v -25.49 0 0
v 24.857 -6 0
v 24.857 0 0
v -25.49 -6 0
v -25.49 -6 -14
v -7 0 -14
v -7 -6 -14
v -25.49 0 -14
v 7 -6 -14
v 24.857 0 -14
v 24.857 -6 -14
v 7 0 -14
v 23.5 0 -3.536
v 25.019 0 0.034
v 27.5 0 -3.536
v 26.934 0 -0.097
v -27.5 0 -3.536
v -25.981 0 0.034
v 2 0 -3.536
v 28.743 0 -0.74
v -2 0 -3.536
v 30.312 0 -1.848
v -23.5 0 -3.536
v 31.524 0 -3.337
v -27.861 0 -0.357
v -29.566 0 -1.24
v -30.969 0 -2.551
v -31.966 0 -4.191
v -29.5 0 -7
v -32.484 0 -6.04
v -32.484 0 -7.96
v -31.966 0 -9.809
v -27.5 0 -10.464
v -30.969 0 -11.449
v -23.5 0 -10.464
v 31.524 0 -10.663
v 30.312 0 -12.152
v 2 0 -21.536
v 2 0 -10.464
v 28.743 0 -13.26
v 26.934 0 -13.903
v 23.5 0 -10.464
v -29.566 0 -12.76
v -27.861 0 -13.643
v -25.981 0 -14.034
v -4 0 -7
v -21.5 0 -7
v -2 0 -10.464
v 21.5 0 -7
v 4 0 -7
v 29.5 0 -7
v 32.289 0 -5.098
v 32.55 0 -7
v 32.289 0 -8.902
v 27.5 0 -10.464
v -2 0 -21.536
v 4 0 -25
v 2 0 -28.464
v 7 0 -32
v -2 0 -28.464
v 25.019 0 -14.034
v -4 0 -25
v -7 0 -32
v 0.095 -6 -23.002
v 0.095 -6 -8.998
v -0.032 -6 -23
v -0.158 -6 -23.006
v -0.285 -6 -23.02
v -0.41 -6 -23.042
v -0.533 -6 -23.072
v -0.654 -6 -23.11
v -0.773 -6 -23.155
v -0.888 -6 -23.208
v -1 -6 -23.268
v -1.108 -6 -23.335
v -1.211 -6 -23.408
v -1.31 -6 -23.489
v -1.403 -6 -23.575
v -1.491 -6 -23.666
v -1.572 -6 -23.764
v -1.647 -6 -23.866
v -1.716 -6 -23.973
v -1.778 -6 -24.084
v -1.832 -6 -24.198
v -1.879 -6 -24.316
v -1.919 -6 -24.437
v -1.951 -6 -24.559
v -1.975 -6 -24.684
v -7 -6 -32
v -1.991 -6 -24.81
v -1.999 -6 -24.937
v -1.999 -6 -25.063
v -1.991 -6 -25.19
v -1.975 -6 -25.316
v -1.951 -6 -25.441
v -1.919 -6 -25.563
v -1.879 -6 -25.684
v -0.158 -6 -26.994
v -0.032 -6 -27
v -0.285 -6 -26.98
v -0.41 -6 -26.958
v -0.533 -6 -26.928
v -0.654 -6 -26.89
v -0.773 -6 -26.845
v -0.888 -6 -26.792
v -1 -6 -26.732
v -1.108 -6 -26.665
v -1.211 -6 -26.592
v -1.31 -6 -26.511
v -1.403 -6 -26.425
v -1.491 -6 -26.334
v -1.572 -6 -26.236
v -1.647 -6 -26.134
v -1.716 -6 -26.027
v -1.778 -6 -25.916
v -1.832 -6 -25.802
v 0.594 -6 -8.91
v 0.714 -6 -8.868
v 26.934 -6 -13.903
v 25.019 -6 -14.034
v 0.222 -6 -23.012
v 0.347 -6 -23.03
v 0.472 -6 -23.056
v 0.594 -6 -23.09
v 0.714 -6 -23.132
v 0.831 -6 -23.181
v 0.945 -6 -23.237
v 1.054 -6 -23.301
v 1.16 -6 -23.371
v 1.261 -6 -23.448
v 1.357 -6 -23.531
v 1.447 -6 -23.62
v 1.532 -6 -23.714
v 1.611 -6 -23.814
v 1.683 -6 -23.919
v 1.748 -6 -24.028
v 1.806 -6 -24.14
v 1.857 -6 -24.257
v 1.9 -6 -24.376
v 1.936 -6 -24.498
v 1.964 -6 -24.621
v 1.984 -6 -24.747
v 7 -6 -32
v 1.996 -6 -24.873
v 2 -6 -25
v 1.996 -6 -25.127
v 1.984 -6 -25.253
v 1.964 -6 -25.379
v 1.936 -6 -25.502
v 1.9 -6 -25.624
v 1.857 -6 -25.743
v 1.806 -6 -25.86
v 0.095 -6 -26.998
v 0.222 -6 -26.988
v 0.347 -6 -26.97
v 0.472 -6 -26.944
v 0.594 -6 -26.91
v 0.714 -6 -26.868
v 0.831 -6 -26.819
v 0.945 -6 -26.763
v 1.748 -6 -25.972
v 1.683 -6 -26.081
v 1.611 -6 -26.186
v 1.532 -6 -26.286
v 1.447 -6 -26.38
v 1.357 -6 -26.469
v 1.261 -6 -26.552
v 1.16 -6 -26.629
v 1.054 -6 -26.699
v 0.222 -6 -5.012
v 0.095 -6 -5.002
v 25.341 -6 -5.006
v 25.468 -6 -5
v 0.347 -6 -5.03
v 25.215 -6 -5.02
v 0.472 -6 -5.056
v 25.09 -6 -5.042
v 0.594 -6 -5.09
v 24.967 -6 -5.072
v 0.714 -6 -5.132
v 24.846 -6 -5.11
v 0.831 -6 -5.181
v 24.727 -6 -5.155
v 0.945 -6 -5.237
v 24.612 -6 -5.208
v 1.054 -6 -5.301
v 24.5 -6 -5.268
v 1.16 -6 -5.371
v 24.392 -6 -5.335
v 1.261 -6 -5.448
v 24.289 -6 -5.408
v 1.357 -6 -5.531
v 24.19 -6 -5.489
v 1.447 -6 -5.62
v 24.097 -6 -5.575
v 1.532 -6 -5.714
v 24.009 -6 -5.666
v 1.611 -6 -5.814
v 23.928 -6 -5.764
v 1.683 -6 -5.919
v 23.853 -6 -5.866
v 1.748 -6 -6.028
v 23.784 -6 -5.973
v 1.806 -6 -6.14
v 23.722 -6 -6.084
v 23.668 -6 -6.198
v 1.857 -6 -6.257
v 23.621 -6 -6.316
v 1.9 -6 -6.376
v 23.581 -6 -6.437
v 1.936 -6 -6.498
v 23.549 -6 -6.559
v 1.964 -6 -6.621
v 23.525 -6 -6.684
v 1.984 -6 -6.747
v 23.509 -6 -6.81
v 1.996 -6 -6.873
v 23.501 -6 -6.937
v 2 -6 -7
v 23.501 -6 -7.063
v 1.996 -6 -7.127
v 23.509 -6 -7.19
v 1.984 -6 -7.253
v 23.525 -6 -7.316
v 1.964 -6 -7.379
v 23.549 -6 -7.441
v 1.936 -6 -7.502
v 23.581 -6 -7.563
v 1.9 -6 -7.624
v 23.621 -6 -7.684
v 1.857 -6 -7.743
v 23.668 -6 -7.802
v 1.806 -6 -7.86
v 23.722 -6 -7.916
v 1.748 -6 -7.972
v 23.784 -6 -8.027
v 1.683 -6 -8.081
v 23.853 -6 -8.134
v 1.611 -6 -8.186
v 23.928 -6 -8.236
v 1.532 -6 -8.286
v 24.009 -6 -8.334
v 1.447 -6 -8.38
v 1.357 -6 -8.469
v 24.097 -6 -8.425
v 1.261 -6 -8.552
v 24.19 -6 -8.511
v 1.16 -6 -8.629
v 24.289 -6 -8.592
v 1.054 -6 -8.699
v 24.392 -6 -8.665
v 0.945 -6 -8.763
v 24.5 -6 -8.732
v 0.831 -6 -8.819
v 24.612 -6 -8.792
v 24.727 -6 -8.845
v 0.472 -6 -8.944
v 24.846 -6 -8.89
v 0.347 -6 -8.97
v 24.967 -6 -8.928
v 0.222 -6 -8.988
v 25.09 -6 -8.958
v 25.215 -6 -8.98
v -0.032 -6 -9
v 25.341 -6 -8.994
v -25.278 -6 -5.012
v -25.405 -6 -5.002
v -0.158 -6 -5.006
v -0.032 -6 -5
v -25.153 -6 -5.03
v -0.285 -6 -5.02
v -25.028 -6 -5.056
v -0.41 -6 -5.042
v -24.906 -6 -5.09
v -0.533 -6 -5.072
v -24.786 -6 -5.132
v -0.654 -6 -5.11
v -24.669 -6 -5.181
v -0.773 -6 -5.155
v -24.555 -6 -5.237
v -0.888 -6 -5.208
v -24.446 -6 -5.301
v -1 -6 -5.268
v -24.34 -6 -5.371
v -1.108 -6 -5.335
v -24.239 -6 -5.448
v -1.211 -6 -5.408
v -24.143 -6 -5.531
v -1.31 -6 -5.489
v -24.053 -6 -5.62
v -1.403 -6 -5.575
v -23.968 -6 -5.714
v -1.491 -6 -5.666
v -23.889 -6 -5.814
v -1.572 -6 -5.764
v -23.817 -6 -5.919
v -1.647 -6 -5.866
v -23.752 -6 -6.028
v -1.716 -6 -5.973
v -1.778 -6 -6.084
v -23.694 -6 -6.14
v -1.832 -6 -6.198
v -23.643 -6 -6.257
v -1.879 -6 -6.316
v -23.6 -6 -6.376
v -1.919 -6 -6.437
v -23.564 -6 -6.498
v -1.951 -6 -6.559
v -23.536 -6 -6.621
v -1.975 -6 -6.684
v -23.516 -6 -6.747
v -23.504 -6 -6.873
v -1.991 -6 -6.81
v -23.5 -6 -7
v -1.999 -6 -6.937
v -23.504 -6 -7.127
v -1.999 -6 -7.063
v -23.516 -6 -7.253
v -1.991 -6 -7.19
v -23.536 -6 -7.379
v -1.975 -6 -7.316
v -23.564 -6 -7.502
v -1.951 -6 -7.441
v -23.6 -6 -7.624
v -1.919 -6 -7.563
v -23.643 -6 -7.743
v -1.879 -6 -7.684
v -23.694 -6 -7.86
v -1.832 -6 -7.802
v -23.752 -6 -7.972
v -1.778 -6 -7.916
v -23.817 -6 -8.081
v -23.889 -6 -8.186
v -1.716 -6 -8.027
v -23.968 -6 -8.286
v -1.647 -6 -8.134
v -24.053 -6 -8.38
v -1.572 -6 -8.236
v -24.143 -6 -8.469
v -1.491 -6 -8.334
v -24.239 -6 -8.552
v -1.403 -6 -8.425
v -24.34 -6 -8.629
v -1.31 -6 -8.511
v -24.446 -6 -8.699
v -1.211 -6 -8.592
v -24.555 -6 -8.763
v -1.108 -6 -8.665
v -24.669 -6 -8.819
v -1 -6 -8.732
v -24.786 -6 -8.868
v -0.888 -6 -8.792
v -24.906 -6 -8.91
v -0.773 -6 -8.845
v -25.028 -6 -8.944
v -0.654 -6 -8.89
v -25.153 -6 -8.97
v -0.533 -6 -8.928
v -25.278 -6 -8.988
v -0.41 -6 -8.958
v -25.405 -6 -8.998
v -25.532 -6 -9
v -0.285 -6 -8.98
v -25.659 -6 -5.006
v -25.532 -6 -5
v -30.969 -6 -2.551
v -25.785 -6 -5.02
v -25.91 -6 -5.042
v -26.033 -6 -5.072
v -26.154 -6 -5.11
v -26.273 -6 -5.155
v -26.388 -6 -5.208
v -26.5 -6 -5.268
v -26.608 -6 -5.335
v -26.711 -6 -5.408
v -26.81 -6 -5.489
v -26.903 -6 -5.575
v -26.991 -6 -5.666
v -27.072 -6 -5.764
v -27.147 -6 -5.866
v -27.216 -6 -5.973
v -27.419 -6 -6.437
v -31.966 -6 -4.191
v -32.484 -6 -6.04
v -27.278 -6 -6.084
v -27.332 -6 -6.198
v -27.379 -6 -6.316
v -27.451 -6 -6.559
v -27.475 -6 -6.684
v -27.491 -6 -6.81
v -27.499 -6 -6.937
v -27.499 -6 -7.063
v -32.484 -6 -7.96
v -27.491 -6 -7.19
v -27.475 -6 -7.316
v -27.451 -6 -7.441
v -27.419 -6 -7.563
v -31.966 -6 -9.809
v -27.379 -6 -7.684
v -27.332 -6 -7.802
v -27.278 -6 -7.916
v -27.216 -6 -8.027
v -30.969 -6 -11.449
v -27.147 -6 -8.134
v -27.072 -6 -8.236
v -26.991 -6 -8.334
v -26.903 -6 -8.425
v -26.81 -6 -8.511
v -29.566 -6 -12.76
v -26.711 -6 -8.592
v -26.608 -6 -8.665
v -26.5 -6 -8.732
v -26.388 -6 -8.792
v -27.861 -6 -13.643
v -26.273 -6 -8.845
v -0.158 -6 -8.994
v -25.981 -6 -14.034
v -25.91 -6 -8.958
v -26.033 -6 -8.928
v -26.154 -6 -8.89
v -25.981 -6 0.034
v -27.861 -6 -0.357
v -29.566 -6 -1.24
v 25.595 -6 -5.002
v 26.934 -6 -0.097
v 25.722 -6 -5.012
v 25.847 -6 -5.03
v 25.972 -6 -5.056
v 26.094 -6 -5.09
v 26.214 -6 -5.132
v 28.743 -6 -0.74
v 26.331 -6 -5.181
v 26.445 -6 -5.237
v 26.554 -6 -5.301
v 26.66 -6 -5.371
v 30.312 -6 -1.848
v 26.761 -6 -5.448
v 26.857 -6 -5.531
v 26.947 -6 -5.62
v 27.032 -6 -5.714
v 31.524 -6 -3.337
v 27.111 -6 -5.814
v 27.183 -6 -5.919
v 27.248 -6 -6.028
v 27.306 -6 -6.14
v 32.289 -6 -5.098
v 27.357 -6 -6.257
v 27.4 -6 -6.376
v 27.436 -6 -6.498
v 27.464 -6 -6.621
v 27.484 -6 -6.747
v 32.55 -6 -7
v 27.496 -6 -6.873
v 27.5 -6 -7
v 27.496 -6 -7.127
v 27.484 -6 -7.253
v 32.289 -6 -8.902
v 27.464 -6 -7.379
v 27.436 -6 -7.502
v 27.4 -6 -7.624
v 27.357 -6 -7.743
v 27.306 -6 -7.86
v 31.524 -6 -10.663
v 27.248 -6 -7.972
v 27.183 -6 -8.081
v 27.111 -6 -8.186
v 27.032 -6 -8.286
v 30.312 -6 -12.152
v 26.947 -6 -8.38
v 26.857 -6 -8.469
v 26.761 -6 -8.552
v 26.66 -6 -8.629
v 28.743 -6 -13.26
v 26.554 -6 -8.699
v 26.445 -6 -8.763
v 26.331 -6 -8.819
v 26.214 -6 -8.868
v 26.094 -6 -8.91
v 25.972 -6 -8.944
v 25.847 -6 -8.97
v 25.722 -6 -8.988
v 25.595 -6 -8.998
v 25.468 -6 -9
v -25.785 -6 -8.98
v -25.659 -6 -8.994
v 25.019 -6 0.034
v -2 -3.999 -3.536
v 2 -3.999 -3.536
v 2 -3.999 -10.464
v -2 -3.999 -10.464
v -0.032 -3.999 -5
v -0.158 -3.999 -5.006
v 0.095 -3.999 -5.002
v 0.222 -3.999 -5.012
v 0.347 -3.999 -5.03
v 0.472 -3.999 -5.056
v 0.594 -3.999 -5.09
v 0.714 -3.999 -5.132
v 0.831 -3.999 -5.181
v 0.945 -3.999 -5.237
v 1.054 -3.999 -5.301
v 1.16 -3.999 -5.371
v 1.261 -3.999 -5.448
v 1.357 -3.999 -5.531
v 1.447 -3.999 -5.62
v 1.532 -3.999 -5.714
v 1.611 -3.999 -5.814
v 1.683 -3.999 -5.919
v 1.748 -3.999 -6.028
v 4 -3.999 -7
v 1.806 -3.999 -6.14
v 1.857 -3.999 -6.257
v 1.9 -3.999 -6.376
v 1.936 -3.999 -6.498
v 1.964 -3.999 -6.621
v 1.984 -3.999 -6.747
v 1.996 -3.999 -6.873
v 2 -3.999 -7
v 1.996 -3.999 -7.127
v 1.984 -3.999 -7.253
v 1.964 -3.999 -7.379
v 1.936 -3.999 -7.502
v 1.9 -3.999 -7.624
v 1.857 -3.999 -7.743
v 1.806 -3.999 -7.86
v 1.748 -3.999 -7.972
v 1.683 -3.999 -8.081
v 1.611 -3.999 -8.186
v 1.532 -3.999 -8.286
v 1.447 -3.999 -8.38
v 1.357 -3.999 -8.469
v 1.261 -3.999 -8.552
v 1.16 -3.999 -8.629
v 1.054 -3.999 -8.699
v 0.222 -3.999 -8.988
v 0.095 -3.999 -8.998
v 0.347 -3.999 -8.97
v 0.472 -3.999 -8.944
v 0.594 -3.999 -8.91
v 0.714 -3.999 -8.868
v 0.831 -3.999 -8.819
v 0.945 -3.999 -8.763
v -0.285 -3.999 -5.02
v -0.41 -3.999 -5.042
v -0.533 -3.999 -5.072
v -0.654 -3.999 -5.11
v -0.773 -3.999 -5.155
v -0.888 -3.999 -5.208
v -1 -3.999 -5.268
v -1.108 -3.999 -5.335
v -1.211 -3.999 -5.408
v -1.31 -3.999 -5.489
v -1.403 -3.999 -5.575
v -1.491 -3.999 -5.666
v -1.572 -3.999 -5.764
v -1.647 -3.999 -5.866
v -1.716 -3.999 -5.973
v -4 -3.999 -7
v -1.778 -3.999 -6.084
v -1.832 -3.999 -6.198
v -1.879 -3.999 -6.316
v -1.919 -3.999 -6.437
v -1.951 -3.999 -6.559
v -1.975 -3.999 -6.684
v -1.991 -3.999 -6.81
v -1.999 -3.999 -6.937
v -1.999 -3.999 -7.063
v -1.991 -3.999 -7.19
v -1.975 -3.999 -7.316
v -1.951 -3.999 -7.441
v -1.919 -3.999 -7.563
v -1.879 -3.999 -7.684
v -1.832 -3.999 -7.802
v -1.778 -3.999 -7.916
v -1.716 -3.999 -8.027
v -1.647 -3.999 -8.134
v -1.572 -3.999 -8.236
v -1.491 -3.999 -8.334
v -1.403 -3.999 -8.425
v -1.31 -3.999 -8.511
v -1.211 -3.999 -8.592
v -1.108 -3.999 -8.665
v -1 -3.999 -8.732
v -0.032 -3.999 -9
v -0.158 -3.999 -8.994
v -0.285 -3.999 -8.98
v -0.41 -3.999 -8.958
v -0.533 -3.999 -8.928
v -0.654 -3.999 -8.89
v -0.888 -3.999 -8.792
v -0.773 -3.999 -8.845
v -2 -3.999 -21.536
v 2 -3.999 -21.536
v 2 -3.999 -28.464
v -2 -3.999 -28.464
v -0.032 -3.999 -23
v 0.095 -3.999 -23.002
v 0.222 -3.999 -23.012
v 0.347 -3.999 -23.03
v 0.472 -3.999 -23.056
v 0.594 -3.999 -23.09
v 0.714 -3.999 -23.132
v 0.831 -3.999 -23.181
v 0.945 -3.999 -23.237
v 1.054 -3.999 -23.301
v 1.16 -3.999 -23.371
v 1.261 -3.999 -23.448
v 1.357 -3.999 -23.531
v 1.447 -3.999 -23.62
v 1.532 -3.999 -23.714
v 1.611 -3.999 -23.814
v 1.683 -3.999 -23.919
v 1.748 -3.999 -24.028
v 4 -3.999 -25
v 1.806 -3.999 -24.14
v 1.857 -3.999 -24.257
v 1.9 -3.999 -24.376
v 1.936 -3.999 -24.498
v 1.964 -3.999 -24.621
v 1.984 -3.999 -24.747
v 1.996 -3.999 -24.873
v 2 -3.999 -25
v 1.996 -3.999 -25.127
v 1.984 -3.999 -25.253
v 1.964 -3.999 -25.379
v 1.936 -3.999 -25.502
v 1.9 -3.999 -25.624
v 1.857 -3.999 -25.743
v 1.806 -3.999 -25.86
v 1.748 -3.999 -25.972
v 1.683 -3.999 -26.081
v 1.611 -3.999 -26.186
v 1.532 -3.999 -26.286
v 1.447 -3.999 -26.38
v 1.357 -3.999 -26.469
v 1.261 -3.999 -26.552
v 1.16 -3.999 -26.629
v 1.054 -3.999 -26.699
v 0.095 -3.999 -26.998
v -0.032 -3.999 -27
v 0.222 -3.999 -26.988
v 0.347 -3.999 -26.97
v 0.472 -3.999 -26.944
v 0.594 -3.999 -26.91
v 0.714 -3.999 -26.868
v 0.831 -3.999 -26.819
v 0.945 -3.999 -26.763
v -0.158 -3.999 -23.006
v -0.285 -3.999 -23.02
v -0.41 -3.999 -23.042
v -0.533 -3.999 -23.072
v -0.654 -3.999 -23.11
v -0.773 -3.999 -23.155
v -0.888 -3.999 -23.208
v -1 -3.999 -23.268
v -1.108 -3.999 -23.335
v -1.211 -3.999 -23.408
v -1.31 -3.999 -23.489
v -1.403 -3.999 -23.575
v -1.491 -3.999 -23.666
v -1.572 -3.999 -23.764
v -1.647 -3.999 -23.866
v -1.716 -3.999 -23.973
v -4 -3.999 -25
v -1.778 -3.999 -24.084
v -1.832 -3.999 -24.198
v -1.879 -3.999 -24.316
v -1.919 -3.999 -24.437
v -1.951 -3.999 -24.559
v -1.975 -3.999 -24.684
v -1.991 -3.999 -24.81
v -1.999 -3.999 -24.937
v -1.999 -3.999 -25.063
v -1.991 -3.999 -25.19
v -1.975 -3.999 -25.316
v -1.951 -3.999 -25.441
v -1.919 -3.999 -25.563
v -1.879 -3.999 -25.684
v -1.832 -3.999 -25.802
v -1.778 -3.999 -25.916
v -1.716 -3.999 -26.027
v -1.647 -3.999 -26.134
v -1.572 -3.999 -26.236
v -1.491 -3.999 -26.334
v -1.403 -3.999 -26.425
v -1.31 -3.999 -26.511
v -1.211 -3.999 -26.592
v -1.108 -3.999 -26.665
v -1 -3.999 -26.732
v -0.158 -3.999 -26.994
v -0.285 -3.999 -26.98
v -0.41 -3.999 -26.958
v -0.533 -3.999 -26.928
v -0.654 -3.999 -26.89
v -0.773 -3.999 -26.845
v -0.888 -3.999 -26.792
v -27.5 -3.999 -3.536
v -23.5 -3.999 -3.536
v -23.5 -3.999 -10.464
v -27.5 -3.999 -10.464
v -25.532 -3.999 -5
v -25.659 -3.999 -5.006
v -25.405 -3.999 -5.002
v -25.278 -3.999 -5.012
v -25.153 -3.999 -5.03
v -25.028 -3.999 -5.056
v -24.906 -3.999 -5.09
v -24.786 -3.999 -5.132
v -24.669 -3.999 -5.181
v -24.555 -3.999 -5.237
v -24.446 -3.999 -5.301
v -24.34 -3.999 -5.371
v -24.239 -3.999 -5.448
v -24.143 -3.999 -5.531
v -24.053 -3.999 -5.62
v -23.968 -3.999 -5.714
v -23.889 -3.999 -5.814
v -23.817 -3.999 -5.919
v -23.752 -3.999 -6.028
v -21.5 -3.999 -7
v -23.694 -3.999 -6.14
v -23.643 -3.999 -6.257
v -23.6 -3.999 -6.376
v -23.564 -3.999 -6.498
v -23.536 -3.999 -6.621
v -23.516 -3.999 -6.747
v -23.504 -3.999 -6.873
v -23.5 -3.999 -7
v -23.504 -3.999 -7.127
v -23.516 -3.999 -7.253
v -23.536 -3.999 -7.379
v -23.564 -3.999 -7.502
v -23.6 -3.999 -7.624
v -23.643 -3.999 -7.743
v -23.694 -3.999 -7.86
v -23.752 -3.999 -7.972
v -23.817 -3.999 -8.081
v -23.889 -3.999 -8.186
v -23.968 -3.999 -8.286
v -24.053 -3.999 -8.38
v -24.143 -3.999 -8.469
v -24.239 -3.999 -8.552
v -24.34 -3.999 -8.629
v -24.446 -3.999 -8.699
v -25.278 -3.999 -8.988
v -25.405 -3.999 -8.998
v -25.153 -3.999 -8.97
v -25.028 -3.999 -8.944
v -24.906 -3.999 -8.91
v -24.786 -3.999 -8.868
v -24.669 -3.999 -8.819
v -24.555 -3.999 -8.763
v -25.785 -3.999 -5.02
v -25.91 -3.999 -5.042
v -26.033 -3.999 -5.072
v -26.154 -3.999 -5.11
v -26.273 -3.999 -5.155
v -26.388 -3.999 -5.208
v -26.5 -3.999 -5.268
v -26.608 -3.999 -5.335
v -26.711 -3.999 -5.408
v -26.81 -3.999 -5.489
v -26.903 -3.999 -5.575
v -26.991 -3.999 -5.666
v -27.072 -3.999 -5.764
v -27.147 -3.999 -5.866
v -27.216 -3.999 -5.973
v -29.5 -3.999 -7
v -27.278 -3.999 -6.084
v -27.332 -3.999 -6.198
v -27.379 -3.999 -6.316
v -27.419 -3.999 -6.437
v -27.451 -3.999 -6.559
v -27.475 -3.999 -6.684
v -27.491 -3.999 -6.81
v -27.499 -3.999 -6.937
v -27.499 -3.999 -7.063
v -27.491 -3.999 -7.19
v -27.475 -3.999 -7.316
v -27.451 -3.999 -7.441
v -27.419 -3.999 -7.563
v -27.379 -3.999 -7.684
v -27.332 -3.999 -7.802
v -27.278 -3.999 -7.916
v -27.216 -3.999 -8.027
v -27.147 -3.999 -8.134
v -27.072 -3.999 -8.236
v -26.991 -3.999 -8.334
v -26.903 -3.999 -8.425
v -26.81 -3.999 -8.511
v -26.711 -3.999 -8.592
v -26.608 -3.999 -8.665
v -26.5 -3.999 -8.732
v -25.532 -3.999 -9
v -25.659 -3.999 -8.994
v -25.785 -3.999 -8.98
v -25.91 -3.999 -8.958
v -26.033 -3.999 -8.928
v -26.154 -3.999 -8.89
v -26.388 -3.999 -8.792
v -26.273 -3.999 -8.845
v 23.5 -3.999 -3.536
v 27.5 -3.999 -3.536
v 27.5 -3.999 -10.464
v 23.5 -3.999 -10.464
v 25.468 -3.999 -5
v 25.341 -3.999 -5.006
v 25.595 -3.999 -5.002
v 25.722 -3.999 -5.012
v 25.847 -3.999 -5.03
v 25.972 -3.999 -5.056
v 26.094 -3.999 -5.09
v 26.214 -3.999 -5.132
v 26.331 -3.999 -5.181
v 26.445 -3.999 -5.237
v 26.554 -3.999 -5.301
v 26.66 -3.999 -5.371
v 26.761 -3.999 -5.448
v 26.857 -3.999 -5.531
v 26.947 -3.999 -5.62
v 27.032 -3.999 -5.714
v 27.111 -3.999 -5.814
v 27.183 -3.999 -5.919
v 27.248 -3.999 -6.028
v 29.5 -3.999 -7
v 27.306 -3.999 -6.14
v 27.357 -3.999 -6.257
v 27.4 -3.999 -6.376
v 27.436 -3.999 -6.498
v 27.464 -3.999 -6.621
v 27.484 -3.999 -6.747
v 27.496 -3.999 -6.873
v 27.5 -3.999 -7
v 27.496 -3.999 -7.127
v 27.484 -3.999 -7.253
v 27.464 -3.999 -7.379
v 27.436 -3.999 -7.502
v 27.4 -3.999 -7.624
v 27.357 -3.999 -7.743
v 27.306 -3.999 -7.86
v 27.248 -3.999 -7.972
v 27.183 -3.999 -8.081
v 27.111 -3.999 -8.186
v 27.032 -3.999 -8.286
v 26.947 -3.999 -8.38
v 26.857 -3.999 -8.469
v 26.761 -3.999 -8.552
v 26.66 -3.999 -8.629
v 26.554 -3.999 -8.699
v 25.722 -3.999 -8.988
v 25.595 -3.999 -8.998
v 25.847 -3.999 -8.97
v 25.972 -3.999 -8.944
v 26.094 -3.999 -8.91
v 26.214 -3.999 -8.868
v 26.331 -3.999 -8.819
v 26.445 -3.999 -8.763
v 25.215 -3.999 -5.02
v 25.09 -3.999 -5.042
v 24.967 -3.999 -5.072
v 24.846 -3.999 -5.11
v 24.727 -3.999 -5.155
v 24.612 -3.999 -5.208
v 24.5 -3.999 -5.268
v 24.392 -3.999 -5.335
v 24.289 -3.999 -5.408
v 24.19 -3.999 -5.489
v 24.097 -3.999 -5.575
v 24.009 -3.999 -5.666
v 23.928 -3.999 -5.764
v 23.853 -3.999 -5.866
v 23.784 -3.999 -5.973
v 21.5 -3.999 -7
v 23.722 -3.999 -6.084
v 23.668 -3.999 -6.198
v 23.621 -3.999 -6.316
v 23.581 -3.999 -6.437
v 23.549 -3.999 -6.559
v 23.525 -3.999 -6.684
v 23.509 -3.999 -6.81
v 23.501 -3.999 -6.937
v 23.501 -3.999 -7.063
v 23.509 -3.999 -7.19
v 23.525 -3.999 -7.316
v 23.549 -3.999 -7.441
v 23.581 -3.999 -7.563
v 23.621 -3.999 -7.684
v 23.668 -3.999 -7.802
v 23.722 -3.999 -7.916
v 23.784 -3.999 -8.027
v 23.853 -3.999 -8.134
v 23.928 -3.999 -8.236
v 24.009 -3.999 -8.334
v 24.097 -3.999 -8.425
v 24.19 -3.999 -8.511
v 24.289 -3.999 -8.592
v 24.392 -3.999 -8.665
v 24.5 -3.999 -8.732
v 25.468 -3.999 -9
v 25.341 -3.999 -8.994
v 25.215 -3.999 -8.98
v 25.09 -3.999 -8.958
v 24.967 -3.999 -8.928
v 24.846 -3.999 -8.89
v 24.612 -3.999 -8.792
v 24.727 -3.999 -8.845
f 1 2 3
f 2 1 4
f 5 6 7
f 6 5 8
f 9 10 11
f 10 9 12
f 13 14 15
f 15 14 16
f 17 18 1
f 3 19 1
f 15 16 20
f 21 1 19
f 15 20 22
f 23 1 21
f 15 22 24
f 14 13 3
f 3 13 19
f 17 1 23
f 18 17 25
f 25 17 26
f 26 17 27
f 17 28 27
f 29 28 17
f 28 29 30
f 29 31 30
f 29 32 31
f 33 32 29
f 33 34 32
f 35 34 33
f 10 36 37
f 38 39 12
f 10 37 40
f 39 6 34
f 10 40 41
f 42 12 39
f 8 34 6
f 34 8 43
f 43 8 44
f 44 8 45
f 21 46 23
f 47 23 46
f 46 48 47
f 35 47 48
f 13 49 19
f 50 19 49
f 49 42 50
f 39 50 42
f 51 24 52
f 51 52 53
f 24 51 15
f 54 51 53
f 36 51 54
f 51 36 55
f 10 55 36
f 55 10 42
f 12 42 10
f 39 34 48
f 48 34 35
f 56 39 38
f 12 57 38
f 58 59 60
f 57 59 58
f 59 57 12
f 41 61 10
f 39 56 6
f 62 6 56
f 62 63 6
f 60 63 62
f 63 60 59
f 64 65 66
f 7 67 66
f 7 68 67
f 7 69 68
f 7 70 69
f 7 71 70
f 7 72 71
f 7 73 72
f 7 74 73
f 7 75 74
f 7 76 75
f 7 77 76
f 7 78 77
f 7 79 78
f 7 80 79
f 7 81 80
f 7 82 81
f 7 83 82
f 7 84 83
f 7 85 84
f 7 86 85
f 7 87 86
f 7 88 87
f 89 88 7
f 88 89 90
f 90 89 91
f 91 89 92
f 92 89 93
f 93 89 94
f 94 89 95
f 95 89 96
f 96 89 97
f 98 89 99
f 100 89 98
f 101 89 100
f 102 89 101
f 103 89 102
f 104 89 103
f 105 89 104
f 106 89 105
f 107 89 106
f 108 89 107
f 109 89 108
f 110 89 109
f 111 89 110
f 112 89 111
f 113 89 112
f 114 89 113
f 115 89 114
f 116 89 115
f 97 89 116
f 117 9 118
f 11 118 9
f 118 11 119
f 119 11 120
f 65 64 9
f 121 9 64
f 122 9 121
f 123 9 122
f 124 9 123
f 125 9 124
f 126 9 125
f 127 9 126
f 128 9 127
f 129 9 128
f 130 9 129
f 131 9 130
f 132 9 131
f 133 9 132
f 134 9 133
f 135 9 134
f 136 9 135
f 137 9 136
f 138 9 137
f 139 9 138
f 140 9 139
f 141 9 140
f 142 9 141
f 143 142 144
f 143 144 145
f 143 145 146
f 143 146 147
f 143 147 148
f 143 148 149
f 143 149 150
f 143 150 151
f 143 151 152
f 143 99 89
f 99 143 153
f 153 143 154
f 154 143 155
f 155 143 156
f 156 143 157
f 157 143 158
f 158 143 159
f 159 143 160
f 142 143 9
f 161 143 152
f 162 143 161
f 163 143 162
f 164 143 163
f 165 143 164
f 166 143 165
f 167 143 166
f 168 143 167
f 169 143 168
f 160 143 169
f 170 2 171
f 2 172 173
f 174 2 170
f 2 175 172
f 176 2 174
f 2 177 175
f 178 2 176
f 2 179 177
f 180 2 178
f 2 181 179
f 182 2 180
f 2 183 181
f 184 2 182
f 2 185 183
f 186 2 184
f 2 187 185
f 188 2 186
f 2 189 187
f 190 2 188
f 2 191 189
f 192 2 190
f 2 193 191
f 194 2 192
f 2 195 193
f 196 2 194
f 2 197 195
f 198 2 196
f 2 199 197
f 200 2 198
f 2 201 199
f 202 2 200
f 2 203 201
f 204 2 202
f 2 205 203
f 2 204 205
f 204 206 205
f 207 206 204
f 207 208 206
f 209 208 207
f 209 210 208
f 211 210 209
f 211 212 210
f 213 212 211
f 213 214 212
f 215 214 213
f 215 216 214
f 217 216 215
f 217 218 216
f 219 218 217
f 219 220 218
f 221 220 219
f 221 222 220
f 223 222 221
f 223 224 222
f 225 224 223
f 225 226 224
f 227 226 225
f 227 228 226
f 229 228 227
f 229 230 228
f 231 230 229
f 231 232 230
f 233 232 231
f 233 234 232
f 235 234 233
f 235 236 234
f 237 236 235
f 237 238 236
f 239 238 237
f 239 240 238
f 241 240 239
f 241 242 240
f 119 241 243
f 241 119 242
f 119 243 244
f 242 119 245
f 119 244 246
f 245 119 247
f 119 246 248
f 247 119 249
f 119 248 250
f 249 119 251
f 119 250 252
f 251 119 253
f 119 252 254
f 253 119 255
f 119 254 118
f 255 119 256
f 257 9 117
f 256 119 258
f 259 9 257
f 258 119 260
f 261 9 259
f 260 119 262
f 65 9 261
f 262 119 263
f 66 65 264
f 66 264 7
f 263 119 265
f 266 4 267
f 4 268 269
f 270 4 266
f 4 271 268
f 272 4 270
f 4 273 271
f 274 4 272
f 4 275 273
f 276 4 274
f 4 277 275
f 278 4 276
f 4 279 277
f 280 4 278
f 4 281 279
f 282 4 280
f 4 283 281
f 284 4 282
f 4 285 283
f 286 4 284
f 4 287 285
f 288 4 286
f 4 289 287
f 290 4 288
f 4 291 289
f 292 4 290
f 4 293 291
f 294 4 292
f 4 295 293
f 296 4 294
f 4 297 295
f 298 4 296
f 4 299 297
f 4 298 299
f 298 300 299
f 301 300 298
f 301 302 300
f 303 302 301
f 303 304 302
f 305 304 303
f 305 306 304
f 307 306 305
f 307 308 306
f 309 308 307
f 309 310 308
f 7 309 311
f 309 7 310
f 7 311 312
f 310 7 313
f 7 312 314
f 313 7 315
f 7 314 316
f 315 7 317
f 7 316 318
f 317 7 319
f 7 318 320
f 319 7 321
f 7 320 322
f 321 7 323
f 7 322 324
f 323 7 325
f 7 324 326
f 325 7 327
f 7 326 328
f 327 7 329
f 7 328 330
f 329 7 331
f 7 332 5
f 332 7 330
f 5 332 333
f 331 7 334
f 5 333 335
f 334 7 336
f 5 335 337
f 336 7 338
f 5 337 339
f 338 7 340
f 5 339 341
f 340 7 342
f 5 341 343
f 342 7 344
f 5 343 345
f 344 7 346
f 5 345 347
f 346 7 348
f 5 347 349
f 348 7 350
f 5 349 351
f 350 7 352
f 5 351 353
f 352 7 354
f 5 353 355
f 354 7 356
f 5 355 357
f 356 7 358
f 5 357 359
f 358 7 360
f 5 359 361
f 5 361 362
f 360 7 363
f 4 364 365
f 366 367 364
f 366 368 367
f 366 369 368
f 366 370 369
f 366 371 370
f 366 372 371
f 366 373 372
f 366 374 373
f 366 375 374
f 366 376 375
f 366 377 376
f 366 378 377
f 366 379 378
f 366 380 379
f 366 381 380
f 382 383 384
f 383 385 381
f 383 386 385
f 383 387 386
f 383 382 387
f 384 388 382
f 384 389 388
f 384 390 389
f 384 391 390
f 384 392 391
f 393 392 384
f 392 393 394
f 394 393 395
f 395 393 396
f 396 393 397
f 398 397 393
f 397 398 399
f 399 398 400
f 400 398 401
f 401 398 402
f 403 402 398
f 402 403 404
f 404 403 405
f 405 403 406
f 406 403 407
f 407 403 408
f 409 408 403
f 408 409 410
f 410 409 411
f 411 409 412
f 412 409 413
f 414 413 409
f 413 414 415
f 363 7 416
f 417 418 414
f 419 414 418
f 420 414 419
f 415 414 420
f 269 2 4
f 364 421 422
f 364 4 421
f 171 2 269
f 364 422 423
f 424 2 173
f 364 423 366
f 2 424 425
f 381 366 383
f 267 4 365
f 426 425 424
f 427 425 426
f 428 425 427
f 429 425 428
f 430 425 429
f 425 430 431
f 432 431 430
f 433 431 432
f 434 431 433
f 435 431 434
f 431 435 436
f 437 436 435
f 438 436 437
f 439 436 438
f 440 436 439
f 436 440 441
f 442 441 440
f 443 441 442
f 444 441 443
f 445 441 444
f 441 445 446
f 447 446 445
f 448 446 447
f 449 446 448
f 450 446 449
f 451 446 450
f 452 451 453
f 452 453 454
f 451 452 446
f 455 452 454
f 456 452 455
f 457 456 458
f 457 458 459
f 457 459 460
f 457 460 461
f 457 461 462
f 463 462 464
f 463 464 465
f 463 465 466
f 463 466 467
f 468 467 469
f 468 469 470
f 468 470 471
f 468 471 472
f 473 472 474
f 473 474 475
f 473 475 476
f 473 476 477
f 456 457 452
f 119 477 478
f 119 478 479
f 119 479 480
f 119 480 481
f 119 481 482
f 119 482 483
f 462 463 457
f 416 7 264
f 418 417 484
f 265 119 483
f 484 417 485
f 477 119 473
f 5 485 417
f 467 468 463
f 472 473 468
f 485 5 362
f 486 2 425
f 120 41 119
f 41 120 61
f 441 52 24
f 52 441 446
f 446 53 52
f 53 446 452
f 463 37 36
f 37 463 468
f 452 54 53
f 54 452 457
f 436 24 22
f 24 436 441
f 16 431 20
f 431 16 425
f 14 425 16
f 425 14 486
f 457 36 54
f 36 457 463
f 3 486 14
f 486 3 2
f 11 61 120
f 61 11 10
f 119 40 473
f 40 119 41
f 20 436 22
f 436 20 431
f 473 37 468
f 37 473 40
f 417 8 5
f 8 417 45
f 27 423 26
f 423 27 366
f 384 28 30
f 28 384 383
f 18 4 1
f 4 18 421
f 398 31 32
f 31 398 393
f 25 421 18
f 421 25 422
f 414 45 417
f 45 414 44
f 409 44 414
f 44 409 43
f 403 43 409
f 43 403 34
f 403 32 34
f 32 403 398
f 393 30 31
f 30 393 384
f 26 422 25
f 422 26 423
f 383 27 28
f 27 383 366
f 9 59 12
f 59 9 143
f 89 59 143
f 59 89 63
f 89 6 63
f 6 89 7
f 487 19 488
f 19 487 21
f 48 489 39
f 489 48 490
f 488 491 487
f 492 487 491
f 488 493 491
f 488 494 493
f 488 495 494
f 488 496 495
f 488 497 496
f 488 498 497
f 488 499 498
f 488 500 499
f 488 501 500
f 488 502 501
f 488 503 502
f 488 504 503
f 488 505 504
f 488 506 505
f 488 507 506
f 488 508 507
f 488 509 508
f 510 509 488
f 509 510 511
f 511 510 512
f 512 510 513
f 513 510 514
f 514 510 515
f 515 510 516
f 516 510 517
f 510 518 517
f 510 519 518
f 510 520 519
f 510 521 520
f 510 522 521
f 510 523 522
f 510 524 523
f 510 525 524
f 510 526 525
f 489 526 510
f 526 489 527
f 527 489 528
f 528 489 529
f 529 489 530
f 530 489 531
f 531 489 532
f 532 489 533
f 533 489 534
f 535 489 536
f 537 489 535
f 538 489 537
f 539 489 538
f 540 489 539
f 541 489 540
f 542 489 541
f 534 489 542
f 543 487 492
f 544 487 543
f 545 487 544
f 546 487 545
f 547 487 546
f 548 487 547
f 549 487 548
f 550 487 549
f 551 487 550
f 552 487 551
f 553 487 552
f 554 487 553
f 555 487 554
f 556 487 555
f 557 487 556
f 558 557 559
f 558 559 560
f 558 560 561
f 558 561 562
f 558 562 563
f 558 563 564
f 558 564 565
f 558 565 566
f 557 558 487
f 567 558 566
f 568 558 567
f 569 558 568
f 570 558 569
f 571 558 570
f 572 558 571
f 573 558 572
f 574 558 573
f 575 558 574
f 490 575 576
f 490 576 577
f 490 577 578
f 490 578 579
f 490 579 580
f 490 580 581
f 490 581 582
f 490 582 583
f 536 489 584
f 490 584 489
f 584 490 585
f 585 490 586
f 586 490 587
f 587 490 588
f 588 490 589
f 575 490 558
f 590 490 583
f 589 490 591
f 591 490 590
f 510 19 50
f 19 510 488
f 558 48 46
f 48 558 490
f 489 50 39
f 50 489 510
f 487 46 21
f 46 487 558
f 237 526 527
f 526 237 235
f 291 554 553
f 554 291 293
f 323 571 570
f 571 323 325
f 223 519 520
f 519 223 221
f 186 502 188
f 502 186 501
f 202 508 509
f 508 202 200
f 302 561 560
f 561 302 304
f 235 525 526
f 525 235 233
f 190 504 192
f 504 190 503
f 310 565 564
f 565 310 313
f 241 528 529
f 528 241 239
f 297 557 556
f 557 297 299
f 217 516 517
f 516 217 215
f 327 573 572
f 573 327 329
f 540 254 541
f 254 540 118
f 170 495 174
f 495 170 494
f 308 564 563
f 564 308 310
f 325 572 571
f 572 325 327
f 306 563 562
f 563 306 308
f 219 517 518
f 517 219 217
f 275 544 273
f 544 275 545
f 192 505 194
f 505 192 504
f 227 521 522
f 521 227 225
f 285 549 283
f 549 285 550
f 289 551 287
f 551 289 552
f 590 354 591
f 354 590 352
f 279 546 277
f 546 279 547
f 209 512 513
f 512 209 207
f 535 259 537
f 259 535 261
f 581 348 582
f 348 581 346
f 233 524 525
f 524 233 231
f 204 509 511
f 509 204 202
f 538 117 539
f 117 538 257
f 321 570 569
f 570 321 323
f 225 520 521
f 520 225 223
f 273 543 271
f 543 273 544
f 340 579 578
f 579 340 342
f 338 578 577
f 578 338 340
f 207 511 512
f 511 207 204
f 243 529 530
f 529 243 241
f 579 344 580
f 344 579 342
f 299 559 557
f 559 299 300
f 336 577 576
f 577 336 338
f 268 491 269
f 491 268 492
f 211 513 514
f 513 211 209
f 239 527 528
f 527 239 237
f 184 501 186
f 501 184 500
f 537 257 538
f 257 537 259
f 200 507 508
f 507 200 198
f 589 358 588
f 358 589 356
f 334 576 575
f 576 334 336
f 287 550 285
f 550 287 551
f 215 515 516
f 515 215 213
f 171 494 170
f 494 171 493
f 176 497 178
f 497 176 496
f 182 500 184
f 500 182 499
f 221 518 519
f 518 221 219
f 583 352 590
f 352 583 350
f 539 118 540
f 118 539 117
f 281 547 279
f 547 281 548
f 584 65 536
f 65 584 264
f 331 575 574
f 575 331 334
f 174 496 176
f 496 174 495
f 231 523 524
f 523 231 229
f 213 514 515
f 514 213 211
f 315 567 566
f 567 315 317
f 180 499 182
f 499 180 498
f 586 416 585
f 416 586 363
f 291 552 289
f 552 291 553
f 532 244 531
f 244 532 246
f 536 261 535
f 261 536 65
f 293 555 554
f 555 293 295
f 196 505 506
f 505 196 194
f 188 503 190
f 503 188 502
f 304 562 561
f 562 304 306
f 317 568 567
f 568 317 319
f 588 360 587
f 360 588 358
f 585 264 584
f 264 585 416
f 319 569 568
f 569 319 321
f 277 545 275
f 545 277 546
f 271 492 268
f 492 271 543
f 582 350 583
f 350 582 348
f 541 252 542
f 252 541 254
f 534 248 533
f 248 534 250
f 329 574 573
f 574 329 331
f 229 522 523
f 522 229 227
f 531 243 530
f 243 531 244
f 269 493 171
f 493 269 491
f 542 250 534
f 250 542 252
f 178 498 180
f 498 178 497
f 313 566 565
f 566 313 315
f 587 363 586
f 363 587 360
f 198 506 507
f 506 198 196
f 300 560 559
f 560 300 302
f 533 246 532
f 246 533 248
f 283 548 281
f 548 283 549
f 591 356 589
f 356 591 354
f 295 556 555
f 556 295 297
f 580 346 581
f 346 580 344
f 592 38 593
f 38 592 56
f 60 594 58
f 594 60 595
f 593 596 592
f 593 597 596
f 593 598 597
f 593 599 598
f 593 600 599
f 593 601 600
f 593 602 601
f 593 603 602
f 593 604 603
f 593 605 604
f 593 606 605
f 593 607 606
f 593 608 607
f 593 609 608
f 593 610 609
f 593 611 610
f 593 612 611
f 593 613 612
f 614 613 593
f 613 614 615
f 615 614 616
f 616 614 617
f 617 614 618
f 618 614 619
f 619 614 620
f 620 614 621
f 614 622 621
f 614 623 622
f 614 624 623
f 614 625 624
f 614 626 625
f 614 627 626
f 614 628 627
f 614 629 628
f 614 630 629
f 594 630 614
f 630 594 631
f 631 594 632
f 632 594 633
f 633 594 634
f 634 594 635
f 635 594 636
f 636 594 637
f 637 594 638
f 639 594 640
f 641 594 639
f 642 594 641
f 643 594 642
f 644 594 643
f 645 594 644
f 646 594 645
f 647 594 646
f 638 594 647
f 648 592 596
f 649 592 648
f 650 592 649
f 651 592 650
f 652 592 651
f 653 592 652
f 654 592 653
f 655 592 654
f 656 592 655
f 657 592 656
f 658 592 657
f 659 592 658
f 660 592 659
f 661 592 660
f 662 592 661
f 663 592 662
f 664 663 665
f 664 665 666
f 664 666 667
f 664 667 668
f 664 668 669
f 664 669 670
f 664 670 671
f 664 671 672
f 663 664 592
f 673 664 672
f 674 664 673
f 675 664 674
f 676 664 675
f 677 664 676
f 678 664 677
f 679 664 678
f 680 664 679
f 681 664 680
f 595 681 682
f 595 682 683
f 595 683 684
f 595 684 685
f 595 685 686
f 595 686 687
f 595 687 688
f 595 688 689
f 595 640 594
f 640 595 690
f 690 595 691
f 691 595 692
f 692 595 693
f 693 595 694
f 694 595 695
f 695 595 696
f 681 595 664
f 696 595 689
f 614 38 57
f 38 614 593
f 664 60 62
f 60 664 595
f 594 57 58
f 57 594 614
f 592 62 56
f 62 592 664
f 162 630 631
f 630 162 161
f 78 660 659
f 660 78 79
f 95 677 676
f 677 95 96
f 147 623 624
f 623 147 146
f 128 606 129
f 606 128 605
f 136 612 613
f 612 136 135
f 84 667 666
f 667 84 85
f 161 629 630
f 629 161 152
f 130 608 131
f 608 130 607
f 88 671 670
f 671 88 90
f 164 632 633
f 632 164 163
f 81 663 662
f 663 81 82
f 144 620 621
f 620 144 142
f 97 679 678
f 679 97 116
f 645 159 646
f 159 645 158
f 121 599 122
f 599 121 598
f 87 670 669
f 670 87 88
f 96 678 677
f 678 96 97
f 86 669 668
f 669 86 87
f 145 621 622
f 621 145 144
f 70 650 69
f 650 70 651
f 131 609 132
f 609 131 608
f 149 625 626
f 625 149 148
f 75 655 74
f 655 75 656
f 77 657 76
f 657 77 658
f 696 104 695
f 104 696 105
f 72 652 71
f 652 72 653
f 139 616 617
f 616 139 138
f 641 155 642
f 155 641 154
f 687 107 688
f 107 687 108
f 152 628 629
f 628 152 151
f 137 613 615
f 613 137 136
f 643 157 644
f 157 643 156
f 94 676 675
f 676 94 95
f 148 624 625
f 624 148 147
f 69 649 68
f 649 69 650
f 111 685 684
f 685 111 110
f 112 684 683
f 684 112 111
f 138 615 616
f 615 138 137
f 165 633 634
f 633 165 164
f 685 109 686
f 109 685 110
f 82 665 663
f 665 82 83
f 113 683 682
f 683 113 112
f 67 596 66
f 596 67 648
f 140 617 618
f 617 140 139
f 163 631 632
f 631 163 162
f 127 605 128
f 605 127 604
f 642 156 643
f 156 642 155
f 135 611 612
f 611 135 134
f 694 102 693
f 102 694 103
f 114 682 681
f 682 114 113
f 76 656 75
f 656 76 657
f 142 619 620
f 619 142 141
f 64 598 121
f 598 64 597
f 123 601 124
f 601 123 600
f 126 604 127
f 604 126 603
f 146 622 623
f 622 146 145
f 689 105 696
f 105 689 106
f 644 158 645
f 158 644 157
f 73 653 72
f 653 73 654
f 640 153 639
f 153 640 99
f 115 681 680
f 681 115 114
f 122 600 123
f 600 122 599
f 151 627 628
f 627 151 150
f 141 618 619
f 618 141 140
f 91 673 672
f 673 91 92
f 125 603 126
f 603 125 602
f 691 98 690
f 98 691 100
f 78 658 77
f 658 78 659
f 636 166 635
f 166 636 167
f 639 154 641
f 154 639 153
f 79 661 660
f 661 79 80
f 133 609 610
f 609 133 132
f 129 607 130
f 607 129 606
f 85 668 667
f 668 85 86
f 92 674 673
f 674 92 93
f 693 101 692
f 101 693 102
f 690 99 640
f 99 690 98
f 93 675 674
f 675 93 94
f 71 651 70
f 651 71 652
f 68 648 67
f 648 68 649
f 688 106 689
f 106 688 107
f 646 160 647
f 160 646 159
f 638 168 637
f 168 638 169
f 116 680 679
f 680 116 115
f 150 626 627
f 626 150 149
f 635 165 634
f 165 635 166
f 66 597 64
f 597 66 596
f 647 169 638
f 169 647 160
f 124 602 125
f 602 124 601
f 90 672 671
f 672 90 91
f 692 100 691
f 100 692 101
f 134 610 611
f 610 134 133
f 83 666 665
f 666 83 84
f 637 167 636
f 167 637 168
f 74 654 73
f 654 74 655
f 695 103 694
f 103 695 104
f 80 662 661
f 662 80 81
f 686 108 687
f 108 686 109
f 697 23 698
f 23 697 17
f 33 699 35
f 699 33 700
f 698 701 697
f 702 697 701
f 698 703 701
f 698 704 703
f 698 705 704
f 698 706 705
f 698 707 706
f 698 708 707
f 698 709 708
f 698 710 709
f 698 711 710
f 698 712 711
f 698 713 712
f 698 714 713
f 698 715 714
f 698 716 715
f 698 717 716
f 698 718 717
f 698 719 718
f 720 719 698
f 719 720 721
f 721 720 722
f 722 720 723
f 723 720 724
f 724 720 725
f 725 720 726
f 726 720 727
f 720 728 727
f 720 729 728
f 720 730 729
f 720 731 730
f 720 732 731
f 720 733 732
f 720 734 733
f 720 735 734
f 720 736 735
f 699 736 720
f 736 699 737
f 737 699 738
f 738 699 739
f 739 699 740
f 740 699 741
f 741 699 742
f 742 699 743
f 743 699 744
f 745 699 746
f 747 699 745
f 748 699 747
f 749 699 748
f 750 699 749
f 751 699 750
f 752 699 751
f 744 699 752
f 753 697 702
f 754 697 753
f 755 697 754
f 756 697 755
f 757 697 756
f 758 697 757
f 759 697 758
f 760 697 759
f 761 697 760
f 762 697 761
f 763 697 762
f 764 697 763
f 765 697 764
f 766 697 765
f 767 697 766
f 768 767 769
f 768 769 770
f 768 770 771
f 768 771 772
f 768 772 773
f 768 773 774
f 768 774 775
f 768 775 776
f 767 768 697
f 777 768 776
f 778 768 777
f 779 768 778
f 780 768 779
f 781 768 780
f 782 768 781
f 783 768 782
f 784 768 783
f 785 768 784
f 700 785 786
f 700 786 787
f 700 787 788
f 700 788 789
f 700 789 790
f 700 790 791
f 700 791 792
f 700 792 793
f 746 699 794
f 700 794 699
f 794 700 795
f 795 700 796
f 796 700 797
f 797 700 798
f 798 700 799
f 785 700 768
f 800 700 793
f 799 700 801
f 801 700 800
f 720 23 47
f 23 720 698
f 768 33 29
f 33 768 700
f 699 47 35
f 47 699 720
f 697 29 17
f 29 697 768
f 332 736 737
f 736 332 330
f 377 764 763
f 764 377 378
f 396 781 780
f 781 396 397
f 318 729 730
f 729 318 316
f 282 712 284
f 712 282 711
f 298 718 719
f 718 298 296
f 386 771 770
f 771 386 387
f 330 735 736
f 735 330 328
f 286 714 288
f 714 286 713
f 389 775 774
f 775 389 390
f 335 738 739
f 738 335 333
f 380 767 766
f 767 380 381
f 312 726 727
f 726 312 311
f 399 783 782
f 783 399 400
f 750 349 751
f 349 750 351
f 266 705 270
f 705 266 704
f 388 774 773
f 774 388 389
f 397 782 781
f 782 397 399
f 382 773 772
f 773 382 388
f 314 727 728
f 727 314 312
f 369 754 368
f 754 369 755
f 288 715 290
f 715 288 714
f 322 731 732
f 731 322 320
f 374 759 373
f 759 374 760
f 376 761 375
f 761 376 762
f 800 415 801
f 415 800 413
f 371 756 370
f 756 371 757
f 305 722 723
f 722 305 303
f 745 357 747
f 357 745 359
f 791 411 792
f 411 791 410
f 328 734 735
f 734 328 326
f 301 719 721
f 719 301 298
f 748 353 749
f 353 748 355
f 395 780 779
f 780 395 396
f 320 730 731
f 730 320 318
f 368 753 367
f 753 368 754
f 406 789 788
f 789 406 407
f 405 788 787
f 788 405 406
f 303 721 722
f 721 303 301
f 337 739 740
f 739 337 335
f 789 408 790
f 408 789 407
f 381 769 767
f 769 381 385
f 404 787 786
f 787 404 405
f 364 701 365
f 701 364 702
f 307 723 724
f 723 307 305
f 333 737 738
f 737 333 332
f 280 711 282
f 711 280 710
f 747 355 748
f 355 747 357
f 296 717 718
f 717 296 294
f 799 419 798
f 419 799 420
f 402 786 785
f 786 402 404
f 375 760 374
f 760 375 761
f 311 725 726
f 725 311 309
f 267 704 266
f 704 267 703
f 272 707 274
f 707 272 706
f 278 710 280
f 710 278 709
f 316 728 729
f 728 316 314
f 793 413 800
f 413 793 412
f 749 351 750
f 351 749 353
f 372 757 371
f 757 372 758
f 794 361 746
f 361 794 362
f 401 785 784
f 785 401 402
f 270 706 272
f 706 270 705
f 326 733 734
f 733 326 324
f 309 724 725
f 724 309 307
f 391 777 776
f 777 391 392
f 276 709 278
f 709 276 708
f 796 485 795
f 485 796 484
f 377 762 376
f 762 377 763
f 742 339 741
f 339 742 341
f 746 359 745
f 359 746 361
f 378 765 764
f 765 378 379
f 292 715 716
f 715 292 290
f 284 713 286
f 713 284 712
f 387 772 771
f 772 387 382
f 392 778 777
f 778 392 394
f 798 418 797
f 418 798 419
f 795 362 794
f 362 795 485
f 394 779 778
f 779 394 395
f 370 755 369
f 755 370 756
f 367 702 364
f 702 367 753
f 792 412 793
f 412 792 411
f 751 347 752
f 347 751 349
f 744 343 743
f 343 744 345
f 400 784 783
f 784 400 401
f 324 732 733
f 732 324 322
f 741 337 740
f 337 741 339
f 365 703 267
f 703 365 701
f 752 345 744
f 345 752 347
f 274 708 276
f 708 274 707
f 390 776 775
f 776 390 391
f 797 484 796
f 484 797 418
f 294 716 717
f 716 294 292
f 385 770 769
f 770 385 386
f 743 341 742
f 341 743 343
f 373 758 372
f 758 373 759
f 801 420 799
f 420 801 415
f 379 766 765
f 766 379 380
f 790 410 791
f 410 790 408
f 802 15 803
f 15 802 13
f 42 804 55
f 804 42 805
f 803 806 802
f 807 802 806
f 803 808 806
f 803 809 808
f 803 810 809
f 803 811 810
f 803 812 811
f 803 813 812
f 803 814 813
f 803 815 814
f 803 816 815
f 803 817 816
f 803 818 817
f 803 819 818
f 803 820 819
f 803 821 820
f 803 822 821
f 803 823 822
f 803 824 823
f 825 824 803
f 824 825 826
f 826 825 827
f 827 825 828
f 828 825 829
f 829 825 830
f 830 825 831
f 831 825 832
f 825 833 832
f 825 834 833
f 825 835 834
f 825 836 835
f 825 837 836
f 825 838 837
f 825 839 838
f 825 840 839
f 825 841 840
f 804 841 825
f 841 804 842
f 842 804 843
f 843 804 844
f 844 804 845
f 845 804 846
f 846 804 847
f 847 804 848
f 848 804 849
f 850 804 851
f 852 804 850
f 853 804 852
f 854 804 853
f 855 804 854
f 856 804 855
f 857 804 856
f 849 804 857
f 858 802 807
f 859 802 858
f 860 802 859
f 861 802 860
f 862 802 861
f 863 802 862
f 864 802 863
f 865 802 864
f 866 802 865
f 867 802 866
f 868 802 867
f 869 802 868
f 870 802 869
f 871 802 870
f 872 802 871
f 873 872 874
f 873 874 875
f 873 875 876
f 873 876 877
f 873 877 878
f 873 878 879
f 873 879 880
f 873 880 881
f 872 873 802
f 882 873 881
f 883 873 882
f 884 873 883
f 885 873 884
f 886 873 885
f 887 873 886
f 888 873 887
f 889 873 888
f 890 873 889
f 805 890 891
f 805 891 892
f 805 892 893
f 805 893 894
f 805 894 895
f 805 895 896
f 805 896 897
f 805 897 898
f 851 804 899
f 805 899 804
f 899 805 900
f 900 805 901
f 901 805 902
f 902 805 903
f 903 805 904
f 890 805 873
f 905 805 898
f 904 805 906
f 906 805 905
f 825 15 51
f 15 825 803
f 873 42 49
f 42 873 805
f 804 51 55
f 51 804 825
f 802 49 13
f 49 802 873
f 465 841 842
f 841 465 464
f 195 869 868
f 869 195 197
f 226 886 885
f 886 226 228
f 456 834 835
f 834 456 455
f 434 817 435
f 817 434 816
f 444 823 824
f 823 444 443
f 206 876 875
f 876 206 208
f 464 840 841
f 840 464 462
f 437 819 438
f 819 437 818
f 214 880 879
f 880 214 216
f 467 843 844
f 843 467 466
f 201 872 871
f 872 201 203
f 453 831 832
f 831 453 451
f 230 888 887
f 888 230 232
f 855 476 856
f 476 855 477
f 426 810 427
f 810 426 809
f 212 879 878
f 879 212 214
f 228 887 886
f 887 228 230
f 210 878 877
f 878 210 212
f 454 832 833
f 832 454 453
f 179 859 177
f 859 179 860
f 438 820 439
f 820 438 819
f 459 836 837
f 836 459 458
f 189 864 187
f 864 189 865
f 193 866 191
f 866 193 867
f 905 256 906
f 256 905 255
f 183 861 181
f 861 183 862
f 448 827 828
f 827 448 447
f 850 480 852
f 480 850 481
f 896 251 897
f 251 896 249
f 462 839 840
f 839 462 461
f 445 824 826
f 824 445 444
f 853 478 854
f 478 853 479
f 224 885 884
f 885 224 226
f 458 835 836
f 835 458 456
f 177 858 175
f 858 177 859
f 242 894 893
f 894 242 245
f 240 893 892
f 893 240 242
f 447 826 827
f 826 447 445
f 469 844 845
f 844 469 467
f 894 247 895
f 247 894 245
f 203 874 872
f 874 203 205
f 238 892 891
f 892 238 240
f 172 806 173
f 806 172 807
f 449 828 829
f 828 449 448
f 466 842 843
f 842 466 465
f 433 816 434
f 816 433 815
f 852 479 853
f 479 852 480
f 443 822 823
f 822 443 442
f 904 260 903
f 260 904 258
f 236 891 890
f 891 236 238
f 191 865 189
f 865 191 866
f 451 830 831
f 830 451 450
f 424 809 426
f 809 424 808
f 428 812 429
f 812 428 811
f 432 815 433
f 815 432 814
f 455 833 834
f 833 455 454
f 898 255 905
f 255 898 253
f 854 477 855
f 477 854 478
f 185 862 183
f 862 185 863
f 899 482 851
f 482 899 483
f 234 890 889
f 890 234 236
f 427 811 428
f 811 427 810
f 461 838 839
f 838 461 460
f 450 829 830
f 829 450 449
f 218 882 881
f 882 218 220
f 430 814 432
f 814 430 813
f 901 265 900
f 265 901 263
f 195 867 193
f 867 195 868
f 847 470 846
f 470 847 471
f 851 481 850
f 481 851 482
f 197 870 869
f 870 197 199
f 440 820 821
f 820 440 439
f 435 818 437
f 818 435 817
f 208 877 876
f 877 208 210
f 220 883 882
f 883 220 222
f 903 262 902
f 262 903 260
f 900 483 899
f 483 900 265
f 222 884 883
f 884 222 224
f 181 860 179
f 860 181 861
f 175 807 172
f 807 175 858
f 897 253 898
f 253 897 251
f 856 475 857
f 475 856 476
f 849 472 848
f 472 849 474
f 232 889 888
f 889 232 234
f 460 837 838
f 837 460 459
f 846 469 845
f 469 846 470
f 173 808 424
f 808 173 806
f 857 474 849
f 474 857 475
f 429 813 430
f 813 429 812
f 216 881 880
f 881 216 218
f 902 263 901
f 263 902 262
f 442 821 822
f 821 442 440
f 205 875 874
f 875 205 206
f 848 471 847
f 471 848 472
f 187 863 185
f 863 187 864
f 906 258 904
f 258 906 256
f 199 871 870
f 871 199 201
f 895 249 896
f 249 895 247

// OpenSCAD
/*
T shapped connector for rear bike racks
*/



/* [Rear Rack] */
// distance from center of center screw to center of any side screw
screw_center_horizontal = 25.5;
// distance from center of top screw to center of bottom screw
screw_center_vertical = 18;
// thickness of the part. must be larger than screw head depth as we will try to make screw flush
thickness = 6;
// radius of the screw head. i.e. half of the mm wrench you want to use
hex_head_radius = 4; //[1:12]
// depth of the screw head.
hex_head_depth = 4;
// margin from the screw to the edge of the part
hex_head_margin = 3;
// radius for hole for the screw body, obviously must be smaller than hex_head_radius
screw_hole_radius = 2;
// direction of the hex head (0=flat top, 30=pointy top)
hex_head_rotation = 0; // [0,30]
// how much the hex head hole should pierce trhu the holder part being attached (not usable on this part alone)
hex_head_pierce = 100;

/* [Hidden] */
Ttop_height = 2*hex_head_radius + 2*hex_head_margin;
Tver_height = screw_center_vertical + hex_head_radius+ hex_head_margin + Ttop_height/2;

module T() {
	translate([0,-thickness/2,-Ttop_height/2])
	union(){
		difference() {
			union(){
				// top of the T
				cube(center=true,[screw_center_horizontal*2, thickness, Ttop_height]);
				translate([screw_center_horizontal,0,0]) rotate(a=90,v=[1,0,0])
					cylinder(r=Ttop_height/2+0.05, h=thickness, center=true);
				translate([-screw_center_horizontal,0,0]) rotate(a=90,v=[1,0,0])
					cylinder(r=Ttop_height/2+0.05, h=thickness, center=true);
				// NOTE: the +0.05 on the cylinders above is to remove one artifact when it joing the body. without it, it looked like the radius was smaller than the height of the cube
				// vertical part of T
				translate([0,0,Ttop_height/2-Tver_height/2])
				cube(center=true,[Ttop_height, thickness, Tver_height]);
//translate([0,1,-5]) main();
			}
			// center hole, top
			translate([0,0,0])
				hex_head();
			// center hole, bottom
			translate([0,0,-screw_center_vertical])
				hex_head();
			// right ... yeah, our axis ended up a little off :)
			translate([-screw_center_horizontal,0,0])
				hex_head();
			// left
			translate([screw_center_horizontal,0,0])
				hex_head();
		}
	}
}

/** a sane way to create hexagons. fuck understanding polyhedron syntax at this hour of the night
*/
module hex_head(){
	// logic of this http://hexnet.org/content/hexagonal-geometry
	rotate( a=hex_head_rotation, v=[0,1,0])
	union(){
		translate([0,hex_head_pierce/2+thickness/2-hex_head_depth/2+0.001,0]){
			cube( size = [hex_head_radius,hex_head_pierce+ hex_head_depth+0.001, (hex_head_radius * sqrt(3))], center=true );
			rotate( a=60, v=[0,1,0])
				cube( size = [hex_head_radius, hex_head_pierce+hex_head_depth+0.001, (hex_head_radius * sqrt(3))], center=true );
			rotate( a=120, v=[0,1,0])
				cube( size = [hex_head_radius, hex_head_pierce+hex_head_depth+0.001, (hex_head_radius * sqrt(3))], center=true );
		}

		rotate(a=90,v=[1,0,0])
			translate([0,0,0])
				cylinder(r=screw_hole_radius, h=thickness+0.001+0.001+0.001+0.001, center=true, $fn=99);
				// NOTE: some reason the +0.001 was not working there... 0.004 did the trick, leaving syntax as 0.001 as i will find it with my regexps later
	}
}

T();
